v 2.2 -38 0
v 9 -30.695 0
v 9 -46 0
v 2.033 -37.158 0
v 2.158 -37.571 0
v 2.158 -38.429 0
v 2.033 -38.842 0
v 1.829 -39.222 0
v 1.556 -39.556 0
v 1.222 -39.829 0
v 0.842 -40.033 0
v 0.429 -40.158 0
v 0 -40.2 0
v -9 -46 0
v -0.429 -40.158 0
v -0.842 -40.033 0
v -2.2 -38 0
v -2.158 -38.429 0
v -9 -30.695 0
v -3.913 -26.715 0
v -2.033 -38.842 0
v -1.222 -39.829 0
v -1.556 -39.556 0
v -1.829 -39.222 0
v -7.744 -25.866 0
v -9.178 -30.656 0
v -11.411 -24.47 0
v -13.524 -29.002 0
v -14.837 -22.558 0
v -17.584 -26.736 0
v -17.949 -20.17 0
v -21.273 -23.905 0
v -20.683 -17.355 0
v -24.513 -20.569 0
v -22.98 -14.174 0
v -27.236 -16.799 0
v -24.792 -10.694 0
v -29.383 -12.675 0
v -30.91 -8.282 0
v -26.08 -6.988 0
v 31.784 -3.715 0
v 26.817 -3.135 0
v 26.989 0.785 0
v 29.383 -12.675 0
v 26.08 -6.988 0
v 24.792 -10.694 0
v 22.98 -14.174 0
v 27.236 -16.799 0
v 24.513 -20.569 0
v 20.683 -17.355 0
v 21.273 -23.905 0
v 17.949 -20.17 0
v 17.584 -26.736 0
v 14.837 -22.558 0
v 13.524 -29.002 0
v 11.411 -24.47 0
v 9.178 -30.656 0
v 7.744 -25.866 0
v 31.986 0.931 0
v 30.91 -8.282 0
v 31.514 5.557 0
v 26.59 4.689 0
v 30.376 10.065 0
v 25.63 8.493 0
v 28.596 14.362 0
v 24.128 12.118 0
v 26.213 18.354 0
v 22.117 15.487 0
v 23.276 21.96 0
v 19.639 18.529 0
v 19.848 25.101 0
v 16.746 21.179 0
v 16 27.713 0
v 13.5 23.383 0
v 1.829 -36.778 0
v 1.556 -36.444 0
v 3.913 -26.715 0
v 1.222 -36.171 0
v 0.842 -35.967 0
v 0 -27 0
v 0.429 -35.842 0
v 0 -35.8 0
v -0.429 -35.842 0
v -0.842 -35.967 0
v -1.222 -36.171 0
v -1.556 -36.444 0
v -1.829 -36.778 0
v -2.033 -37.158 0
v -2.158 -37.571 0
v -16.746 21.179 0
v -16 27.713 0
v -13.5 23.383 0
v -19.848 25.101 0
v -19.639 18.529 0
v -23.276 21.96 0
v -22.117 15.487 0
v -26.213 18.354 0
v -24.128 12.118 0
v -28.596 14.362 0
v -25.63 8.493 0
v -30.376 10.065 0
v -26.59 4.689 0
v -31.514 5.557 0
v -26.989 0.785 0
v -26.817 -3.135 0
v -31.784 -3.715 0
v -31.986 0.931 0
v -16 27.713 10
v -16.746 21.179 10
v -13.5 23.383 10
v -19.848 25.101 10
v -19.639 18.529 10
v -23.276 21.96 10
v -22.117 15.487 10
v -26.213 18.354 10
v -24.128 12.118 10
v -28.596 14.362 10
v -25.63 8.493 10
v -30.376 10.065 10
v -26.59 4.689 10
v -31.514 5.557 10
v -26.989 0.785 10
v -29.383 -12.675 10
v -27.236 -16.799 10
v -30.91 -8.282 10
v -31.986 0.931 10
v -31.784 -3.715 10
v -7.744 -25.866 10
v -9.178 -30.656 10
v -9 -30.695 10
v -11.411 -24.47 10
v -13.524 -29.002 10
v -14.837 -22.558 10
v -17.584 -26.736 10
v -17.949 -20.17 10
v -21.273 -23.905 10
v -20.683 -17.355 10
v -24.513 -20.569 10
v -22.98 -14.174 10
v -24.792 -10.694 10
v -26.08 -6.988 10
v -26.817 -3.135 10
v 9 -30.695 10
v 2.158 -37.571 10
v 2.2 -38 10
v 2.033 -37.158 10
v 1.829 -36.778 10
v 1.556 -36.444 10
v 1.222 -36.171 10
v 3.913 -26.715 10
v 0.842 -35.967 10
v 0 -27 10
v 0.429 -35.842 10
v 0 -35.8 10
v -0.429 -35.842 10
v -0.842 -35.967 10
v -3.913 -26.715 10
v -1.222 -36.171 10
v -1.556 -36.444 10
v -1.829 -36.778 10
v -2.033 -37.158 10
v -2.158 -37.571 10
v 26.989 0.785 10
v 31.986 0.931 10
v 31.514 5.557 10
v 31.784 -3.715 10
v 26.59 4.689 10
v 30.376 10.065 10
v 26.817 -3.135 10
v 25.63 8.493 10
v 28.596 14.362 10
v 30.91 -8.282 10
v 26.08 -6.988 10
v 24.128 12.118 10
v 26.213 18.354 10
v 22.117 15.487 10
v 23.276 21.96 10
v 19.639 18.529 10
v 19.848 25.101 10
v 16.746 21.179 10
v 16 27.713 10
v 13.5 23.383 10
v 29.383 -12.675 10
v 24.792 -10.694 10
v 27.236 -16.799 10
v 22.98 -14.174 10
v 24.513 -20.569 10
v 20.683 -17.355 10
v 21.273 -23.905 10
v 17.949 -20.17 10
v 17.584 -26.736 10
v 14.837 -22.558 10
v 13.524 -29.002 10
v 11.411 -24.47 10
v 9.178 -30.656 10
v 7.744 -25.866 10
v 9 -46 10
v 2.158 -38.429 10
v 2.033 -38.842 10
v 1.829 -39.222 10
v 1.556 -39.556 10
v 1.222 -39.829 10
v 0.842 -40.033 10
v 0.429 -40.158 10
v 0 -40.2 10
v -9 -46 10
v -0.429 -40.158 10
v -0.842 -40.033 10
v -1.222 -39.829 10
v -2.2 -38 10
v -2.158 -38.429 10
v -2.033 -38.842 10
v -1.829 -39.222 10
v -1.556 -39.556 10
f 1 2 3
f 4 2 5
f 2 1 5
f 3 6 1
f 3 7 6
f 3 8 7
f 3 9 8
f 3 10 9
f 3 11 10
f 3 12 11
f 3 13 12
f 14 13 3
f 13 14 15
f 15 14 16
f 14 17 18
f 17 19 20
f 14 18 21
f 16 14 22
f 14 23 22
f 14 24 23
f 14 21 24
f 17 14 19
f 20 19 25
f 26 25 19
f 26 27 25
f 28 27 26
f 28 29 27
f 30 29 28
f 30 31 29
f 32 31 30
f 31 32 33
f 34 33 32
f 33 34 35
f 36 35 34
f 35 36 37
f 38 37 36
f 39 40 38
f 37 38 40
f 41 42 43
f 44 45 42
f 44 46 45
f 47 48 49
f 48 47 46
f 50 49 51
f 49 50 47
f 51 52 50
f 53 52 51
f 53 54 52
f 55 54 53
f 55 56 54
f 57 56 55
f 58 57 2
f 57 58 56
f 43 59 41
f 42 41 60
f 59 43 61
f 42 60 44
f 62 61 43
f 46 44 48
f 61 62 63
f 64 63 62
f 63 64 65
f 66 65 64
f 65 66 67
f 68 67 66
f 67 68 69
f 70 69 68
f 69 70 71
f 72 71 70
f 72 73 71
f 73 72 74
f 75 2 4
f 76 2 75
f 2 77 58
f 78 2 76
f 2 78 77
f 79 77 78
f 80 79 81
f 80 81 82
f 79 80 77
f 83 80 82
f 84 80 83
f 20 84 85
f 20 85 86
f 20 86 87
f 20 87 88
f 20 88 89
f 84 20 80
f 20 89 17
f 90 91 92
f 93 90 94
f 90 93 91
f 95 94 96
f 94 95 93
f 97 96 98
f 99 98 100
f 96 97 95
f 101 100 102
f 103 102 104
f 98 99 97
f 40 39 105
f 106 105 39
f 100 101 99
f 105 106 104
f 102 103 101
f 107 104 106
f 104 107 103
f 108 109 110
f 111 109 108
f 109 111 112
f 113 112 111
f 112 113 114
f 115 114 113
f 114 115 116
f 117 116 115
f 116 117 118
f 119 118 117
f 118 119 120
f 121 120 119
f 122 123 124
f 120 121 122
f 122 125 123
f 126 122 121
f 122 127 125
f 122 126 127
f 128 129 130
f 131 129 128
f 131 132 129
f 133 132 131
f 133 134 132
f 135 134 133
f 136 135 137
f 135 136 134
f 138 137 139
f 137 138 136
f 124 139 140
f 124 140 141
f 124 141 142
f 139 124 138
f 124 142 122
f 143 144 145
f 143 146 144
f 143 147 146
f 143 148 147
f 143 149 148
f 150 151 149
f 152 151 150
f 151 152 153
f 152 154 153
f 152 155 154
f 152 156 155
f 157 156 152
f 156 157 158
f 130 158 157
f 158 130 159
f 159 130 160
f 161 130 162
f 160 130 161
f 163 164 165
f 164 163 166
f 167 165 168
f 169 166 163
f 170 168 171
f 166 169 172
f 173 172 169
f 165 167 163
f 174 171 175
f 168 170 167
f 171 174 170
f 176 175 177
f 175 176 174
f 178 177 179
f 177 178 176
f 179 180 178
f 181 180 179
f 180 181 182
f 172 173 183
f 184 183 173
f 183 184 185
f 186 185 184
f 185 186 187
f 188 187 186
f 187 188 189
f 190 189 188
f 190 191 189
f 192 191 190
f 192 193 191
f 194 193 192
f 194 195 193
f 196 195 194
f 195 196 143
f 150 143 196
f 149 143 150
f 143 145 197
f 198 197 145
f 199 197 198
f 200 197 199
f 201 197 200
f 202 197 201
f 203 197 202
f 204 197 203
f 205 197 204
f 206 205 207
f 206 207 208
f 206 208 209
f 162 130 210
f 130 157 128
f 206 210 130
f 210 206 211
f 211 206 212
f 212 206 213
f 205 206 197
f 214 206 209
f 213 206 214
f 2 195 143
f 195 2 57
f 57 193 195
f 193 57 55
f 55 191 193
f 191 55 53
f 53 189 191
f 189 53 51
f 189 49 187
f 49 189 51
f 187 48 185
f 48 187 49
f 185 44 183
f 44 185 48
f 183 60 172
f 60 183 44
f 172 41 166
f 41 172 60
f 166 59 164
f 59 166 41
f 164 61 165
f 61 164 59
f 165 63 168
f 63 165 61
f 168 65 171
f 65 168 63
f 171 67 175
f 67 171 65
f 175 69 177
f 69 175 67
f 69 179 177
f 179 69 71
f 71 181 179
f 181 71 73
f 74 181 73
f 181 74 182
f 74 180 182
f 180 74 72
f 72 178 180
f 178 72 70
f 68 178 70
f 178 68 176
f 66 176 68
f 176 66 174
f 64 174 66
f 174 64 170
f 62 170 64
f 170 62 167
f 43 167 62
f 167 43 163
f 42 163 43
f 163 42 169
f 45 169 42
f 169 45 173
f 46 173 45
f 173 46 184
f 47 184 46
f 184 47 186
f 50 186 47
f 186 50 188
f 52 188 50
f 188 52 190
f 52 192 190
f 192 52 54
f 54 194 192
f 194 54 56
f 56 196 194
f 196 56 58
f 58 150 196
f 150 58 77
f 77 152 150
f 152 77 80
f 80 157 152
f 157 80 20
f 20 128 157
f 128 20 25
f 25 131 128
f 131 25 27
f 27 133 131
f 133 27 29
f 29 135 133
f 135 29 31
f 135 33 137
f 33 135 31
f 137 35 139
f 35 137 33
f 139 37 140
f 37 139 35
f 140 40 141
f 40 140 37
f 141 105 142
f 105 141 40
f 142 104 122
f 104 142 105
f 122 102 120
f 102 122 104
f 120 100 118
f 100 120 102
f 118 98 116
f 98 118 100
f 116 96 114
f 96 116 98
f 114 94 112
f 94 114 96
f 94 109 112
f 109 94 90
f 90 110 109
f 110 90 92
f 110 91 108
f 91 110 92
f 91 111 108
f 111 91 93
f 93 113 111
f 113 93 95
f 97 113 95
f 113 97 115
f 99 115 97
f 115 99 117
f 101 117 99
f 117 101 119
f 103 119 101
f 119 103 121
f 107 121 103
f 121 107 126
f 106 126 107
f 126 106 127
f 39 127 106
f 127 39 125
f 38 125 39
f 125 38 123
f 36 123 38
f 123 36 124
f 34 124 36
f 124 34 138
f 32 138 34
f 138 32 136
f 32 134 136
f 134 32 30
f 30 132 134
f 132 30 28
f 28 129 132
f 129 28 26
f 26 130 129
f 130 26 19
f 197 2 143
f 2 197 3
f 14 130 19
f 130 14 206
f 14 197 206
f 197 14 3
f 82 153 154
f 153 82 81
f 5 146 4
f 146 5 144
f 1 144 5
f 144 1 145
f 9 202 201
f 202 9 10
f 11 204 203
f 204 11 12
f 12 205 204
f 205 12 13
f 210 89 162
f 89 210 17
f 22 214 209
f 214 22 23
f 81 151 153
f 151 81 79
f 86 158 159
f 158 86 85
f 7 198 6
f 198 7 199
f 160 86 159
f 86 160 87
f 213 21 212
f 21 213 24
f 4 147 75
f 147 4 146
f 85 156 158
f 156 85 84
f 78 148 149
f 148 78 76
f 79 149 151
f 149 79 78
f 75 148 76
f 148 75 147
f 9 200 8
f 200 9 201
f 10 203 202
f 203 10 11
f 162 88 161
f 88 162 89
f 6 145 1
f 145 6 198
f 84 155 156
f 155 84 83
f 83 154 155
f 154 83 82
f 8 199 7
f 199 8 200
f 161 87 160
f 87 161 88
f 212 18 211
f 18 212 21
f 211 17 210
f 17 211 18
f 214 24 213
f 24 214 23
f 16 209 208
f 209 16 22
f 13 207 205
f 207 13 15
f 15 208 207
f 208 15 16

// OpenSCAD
$fn = 32;

// ----------------------------------------------------------------------
// Spring clip: 64 mm outside, 5 mm band, 60 degree opening
// ----------------------------------------------------------------------

// --- parameters (mm) ---
outer_r = 32;             // clip outside radius
inner_r = 27;             // clip bore radius
band = 5;                 // band thickness
clip_w = 10;              // clip width
opening = 60;             // opening angle
tab_w = 18;               // tab width
tab_len = 14;             // tab length past the clip
tab_hole = 4.4;           // tab fixing hole

clip_profile = [[-16, 27.713], [-19.848, 25.101], [-23.276, 21.96], [-26.213, 18.354], [-28.596, 14.362], [-30.376, 10.065], [-31.514, 5.557], [-31.986, 0.931], [-31.784, -3.715], [-30.91, -8.282], [-29.383, -12.675], [-27.236, -16.799], [-24.513, -20.569], [-21.273, -23.905], [-17.584, -26.736], [-13.524, -29.002], [-9.178, -30.656], [-4.638, -31.662], [0, -32], [4.638, -31.662], [9.178, -30.656], [13.524, -29.002], [17.584, -26.736], [21.273, -23.905], [24.513, -20.569], [27.236, -16.799], [29.383, -12.675], [30.91, -8.282], [31.784, -3.715], [31.986, 0.931], [31.514, 5.557], [30.376, 10.065], [28.596, 14.362], [26.213, 18.354], [23.276, 21.96], [19.848, 25.101], [16, 27.713], [13.5, 23.383], [16.746, 21.179], [19.639, 18.529], [22.117, 15.487], [24.128, 12.118], [25.63, 8.493], [26.59, 4.689], [26.989, 0.785], [26.817, -3.135], [26.08, -6.988], [24.792, -10.694], [22.98, -14.174], [20.683, -17.355], [17.949, -20.17], [14.837, -22.558], [11.411, -24.47], [7.744, -25.866], [3.913, -26.715], [0, -27], [-3.913, -26.715], [-7.744, -25.866], [-11.411, -24.47], [-14.837, -22.558], [-17.949, -20.17], [-20.683, -17.355], [-22.98, -14.174], [-24.792, -10.694], [-26.08, -6.988], [-26.817, -3.135], [-26.989, 0.785], [-26.59, 4.689], [-25.63, 8.493], [-24.128, 12.118], [-22.117, 15.487], [-19.639, 18.529], [-16.746, 21.179], [-13.5, 23.383]];

difference() {
  union() {
    linear_extrude(height = clip_w) polygon(clip_profile);
    /* mounting tab, sunk 2 mm into the band */
    translate([-9, -46, 0]) cube([tab_w, 16, clip_w]);
  }
  translate([0, -38, -2.5]) cylinder(h = clip_w + 5, d = tab_hole);
}
